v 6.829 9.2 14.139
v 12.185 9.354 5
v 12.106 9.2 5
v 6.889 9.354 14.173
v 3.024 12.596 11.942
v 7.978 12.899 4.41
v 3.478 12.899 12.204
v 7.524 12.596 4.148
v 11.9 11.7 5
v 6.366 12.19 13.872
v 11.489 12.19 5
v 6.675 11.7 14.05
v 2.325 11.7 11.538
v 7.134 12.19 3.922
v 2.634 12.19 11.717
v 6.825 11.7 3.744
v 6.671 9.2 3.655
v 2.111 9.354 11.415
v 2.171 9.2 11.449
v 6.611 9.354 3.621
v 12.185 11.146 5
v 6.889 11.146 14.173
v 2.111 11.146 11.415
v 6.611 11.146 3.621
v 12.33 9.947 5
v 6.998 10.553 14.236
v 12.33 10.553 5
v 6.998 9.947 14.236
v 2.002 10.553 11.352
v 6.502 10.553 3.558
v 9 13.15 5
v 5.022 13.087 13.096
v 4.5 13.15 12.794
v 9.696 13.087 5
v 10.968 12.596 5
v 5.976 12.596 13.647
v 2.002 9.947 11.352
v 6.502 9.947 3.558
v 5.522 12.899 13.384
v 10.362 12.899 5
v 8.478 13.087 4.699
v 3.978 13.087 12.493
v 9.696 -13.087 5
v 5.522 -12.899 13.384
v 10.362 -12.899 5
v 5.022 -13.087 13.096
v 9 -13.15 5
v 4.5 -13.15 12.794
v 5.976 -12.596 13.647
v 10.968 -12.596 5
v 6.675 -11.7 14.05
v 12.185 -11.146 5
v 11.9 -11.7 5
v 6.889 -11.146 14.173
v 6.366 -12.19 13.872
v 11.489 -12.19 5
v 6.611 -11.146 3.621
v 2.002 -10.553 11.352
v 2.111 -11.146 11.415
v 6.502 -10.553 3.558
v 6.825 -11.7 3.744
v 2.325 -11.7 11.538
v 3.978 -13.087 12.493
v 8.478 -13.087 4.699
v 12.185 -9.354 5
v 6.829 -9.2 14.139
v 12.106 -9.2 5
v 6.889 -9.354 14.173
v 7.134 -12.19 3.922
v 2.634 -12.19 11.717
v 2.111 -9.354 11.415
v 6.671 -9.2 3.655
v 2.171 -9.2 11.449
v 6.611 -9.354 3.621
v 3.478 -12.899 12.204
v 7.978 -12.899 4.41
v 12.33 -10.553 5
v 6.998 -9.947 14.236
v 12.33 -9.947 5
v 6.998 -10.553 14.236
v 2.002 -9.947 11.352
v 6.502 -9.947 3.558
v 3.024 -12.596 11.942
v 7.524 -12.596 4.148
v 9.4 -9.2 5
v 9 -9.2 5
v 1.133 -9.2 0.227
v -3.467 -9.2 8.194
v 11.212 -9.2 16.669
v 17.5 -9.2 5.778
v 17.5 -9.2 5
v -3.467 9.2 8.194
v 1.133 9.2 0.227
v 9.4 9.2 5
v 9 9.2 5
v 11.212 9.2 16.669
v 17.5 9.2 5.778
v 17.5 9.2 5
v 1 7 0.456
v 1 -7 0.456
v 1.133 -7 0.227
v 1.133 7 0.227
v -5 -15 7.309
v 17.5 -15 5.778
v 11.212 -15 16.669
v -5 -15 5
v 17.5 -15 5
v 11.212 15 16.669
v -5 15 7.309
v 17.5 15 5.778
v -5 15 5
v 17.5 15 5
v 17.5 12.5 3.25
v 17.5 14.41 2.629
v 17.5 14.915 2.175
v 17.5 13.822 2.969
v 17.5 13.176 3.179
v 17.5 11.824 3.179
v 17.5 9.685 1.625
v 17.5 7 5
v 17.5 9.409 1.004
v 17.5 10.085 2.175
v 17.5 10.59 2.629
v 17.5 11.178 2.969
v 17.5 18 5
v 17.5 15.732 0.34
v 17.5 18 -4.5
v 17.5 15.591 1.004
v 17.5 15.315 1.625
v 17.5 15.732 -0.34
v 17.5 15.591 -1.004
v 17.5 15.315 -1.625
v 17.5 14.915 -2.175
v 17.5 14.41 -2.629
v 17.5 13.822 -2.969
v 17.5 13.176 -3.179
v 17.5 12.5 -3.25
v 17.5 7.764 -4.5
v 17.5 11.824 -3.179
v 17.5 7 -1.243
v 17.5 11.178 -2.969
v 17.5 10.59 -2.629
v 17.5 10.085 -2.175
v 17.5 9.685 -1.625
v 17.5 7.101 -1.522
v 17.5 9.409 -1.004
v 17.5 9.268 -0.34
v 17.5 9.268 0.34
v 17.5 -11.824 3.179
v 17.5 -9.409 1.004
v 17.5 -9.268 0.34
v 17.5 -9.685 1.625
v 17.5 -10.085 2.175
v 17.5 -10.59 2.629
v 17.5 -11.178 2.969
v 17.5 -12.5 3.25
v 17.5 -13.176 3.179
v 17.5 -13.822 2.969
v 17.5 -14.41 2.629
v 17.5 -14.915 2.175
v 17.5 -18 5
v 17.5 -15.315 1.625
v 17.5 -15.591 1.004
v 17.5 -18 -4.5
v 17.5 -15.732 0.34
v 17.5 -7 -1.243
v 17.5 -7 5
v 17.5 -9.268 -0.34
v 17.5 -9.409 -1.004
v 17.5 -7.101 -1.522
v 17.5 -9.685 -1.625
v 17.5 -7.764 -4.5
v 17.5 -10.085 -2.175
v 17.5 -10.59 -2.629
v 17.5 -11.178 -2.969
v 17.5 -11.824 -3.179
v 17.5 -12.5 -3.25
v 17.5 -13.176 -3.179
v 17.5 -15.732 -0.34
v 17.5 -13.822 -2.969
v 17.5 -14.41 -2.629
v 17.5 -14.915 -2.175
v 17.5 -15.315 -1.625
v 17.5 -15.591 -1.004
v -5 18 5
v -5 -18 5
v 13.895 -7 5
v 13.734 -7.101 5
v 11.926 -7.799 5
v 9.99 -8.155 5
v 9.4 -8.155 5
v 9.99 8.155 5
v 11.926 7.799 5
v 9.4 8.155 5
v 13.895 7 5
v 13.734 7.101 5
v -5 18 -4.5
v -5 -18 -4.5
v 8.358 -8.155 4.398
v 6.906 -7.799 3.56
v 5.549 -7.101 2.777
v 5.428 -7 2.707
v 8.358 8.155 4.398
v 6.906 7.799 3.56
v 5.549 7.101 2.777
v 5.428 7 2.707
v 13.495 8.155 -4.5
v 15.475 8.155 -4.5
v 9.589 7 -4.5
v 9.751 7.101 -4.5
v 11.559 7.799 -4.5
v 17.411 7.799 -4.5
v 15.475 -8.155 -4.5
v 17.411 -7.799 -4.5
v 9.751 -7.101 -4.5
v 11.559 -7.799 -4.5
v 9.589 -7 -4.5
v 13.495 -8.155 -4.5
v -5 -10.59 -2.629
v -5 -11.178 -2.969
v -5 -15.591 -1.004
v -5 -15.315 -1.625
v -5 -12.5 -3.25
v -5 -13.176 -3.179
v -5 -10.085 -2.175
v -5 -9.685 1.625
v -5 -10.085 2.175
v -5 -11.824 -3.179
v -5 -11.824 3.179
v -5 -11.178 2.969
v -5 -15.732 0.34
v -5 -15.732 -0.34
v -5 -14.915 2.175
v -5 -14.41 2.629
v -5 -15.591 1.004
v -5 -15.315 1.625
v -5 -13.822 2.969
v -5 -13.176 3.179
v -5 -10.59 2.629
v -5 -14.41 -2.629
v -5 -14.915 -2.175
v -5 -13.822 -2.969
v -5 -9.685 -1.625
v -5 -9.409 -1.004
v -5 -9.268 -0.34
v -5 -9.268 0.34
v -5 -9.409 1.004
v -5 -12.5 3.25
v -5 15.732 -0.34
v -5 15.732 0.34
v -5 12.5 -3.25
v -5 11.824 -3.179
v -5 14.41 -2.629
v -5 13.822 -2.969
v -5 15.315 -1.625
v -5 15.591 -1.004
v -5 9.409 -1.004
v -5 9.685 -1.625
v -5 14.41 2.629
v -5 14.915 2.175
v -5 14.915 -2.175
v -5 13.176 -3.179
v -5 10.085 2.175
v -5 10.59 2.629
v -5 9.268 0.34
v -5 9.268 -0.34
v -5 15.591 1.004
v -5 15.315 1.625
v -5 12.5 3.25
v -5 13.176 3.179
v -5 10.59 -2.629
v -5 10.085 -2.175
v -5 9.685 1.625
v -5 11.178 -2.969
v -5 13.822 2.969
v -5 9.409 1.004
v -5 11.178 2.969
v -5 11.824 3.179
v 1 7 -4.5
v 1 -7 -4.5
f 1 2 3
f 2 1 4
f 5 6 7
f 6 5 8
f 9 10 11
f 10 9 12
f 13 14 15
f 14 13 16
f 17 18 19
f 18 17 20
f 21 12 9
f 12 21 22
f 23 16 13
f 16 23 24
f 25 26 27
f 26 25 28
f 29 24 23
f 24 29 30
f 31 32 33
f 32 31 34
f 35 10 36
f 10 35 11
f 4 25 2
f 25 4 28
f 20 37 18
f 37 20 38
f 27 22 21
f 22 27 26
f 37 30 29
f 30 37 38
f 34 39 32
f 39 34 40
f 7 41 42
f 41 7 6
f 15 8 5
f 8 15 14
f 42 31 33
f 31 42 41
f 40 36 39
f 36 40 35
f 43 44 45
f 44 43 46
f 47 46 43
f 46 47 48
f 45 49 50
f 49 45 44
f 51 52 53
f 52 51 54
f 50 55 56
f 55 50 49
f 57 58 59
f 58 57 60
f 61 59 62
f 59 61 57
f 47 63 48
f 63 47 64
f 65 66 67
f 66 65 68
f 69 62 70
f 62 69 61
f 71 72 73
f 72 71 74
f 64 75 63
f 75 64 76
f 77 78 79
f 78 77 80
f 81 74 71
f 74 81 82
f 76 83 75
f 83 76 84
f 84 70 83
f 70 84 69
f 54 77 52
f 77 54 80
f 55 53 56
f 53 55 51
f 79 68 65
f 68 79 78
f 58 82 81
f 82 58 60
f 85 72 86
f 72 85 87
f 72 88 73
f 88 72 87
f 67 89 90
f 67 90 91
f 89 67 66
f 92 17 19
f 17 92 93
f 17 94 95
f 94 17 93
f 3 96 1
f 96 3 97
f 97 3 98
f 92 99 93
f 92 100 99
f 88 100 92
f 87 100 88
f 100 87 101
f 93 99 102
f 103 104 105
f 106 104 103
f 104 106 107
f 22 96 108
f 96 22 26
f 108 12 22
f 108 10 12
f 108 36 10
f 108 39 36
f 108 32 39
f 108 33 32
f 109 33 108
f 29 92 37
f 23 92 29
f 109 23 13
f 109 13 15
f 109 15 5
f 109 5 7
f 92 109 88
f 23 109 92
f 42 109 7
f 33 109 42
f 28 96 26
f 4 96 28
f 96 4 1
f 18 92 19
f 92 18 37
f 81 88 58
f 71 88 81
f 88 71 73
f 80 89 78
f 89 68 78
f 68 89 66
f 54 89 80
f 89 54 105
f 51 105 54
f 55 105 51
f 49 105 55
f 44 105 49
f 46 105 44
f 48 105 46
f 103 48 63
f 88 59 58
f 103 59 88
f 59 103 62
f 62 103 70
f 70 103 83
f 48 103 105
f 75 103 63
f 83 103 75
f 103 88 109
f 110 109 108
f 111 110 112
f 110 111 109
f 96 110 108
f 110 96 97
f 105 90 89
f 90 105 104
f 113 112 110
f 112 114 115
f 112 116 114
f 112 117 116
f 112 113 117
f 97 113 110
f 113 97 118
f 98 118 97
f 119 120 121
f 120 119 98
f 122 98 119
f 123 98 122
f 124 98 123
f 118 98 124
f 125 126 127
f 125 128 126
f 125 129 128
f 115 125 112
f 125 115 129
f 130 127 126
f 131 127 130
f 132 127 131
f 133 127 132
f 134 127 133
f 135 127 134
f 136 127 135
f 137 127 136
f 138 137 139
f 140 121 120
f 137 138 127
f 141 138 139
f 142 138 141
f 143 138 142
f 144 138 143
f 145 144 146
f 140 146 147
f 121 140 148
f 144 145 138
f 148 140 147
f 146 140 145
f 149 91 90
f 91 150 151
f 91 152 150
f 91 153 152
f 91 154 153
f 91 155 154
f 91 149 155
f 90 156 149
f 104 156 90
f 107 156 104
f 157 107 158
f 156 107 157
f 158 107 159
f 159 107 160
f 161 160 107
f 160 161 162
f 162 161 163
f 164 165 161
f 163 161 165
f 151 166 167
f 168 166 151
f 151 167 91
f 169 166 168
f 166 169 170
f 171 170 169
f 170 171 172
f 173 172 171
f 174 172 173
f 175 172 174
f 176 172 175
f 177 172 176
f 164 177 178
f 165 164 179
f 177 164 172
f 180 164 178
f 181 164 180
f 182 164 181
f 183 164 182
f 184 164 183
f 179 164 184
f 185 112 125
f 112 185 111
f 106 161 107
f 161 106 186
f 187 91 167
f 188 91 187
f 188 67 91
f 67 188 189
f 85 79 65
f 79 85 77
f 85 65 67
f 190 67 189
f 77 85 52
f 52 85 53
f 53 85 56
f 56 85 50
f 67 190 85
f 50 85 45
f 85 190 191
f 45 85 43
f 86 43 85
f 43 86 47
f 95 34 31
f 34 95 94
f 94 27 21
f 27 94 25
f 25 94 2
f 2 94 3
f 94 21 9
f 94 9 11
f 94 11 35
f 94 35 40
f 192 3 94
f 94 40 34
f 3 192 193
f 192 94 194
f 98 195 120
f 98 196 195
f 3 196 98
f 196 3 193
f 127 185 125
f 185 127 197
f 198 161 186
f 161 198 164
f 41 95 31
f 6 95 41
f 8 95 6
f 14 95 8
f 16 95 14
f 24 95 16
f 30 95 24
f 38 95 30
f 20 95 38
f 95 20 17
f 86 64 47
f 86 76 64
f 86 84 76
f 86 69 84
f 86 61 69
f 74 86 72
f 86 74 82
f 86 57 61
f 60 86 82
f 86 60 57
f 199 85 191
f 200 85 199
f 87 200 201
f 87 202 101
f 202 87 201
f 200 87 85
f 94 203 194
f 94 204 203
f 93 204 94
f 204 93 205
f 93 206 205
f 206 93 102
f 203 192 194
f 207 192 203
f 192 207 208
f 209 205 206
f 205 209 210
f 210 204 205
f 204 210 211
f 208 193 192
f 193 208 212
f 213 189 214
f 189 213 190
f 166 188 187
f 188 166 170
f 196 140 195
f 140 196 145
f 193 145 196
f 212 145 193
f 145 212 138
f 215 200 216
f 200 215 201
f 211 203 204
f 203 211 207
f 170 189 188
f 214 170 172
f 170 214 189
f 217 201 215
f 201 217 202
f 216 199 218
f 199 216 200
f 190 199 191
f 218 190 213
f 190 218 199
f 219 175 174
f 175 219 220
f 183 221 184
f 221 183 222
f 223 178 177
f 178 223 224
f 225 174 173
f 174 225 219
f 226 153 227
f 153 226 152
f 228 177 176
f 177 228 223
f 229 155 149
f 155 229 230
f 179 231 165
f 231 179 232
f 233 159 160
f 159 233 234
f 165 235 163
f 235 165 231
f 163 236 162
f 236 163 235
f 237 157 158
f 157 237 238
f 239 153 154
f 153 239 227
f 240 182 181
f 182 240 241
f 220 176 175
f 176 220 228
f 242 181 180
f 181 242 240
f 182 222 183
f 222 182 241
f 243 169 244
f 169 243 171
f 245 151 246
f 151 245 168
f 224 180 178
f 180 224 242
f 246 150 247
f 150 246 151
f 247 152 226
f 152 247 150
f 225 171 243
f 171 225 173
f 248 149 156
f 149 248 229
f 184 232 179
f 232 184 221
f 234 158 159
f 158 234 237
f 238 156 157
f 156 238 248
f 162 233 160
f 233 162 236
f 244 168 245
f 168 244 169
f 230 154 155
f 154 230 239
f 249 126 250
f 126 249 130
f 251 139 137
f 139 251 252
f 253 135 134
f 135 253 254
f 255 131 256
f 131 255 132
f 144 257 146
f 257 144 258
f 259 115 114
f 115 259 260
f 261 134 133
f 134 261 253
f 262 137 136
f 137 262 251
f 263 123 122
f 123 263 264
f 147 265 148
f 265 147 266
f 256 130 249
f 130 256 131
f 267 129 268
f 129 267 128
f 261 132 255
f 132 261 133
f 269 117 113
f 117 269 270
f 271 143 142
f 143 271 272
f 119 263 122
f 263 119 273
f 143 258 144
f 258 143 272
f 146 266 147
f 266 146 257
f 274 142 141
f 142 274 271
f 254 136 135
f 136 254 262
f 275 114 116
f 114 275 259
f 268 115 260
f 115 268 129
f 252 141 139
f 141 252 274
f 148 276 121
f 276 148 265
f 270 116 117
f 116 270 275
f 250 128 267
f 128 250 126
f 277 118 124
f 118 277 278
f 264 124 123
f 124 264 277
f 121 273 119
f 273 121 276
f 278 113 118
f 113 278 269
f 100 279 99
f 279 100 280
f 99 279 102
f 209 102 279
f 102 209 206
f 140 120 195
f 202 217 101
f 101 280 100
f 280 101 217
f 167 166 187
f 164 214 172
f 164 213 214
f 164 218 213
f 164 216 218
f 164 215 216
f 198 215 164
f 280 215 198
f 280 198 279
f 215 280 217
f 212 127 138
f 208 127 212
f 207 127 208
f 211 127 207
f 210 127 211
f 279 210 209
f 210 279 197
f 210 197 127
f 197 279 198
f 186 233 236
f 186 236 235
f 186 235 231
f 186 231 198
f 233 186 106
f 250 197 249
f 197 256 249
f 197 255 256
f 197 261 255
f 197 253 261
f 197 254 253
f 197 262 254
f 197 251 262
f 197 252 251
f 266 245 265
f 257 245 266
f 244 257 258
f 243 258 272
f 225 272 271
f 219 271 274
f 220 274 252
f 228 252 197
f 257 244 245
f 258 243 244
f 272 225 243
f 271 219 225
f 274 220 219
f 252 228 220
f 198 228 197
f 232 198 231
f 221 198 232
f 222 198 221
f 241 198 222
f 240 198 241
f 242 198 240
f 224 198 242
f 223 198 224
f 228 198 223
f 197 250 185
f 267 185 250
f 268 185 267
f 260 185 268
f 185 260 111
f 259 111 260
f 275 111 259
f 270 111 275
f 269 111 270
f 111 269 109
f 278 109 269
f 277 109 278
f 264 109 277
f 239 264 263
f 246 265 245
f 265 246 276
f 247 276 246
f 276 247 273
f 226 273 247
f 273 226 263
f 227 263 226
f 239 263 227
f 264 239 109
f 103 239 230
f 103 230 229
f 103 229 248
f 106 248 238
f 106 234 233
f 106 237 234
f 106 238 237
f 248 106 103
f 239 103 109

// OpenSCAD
// file: dronePlates.scad
/**
 * dronePlates.scad
 * Plate library
 *
 * GNU GPL V3
 * @author: Victor Potenciano
 */

m3Rad = 3.4/2;
cornerR = 4;

/**
 *
 */
module helperDisk(diameter) {
	cylinder(r = diameter/2, h = 0.6, $fn=20);
}

/**
 *
 */
module roundedRect(size, radius) {
	x = size[0];
	y = size[1];
	z = size[2];

	linear_extrude(height=z)
	hull() {
	// place 4 circles in the corners, with the given radius
	translate([(-x/2)+(radius/2), (-y/2)+(radius/2), 0]){ circle(r=radius); }
	translate([(x/2)-(radius/2), (-y/2)+(radius/2), 0]){ circle(r=radius); }
	translate([(-x/2)+(radius/2), (y/2)-(radius/2), 0]){ circle(r=radius); }
	translate([(x/2)-(radius/2), (y/2)-(radius/2), 0]){ circle(r=radius); }
	}
}

/**
 * rounded rectangle triangle with corner at origin
 */
module roundedTriangle(size, radius) {
	x = size[0];
	y = size[1];
	z = size[2];

	linear_extrude(height=z)
	hull() {
	translate([radius, radius, 0]){ circle(r=radius); }
	translate([x-radius, radius, 0]){ circle(r=radius); }
	translate([radius, y-radius, 0]){ circle(r=radius); }
	}
}

/**
 *
 */
module roundRectPlate(w, l, plateThick=3) {
	difference(){
		roundedRect([l+m3Rad*1.75,w+m3Rad*1.75,plateThick], cornerR);
		translate([l/2, w/2, -0.5]) { cylinder(h = plateThick+1, r = m3Rad, $fn=30); }
		translate([-l/2, w/2, -0.5]) { cylinder(h = plateThick+1, r = m3Rad, $fn=30); }
		translate([l/2, -w/2, -0.5]) { cylinder(h = plateThick+1, r = m3Rad, $fn=30); }
		translate([-l/2, -w/2, -0.5]) { cylinder(h = plateThick+1, r = m3Rad, $fn=30); }
	}
}

/**
 *
 */
module crossSquarePlate(l, thick=3) {
	inDist = cornerR*2+4;
	trianL = sqrt((l*l)/2)-inDist;
	centerR = 4;

	difference(){
		roundRectPlate(l, l, thick);
		translate([0, centerR, -0.5]) { 
			rotate([0,0,45]){ roundedTriangle([trianL,trianL,thick+1], cornerR-2); }
		}
		translate([0, -centerR, -0.5]) { 
			rotate([0,0,225]){ roundedTriangle([trianL,trianL,thick+1], cornerR-2); }
		}
		translate([-centerR, 0, -0.5]) { 
			rotate([0,0,135]){ roundedTriangle([trianL,trianL,thick+1], cornerR-2); }
		}
		translate([centerR, 0, -0.5]) { 
			rotate([0,0,-45]){ roundedTriangle([trianL,trianL,thick+1], cornerR-2); }
		}
	}
}

/**
 *
 */
module hShapePlate(w, l, thick=4) {
	inDist = cornerR*2+1;

	difference(){
		roundRectPlate(w, l, thick);
		translate([0, w/4, -0.5]) { roundedRect([l-inDist,w/2-inDist,thick+1], cornerR-2); }
		translate([0, -w/4, -0.5]) { roundedRect([l-inDist,w/2-inDist,thick+1], cornerR-2); }
	}
}

/**
 *
 */
module motorCircleMount(inDia, outDia, thick=3, extraH=false, d1=19, d2=16, holeR=m3Rad ) {
	difference(){
		cylinder(h = thick, r = outDia/2, $fn=30);
		motorCircleMountHoles(inDia, outDia, thick, extraH, d1=d1, d2=d2, holeR=holeR);
	}
}

/**
 *
 */
module motorCircleMountHoles(inDia, outDia, thick=3, extraH=false, d1=19, d2=16, d3=25, holeR=m3Rad) {
	translate([0, 0, -0.5]) { cylinder(h = thick+1, r = inDia/2, $fn=30); }

	for(i=[0:3]) {
		rotate([0,0,90*i]){
		translate([d1/2, 0, -0.5]) cylinder(h = thick+1, r = holeR, $fn=20);
		translate([d2/2, 0, -0.5]) cylinder(h = thick+1, r = holeR, $fn=20);
		translate([d2/2, -holeR, -0.5]) cube(size = [(d1-d2)/2,holeR*2,thick+1]);
		}
	}
	
	if(extraH==true){	
		for(i=[-1,1]) translate([i*d3/2, 0, -0.5]) { cylinder(h = thick+1, r = holeR, $fn=30); }
	}
}

/**
 *
 */
module motorRectMount(w, l, inDia, thick=3) {
	d1=19;
	d2=16;

	difference(){
		roundRectPlate(w, l, thick);
		translate([0, 0, -0.5]) { cylinder(h = thick+1, r = inDia/2, $fn=30); }
		translate([0, d1/2, -0.5]) { cylinder(h = thick+1, r = m3Rad, $fn=30); }
		translate([0, -d1/2, -0.5]) { cylinder(h = thick+1, r = m3Rad, $fn=30); }
		translate([d2/2, 0, -0.5]) { cylinder(h = thick+1, r = m3Rad, $fn=30); }
		translate([-d2/2, 0, -0.5]) { cylinder(h = thick+1, r = m3Rad, $fn=30); }
	}
}

/**
 *
 */
module tube(inDia, outDia, height) {
	difference(){
		cylinder(h = height, r = outDia/2, $fn=50);
		translate([0, 0, -0.5]) { cylinder(h = height+1, r = inDia/2, $fn=30); }
	}
}

/**
 *
 */
module squareTube(inDia, outDia, height) {
	translate([0,0,height/2]){
	difference(){
		cube(size = [outDia,outDia,height], center = true);
		cube(size = [inDia,inDia,height+1], center = true);
	}
	}
}

/**
 *
 */
module djiFlamewheelHoles(height) {
	a = 23;
	b = 16;
	c = 19.5;
	
	translate([a/2, c/2, 0]) { cylinder(h = height, r = m3Rad, $fn=30); }
	translate([-a/2, c/2, 0]) { cylinder(h = height, r = m3Rad, $fn=30); }
	translate([b/2, -c/2, 0]) { cylinder(h = height, r = m3Rad, $fn=30); }
	translate([-b/2, -c/2, 0]) { cylinder(h = height, r = m3Rad, $fn=30); }
}

/**
 *
 */
module djiFlamewheelHolesBotton(height) {
	a1 = 21;
	c = 19.5;
	
	translate([a1/2, c/2, 0]) { cylinder(h = height, r = m3Rad, $fn=30); }
	translate([-a1/2, c/2, 0]) { cylinder(h = height, r = m3Rad, $fn=30); }
}

/**
 *
 */
module propeller(size){
union(){
difference(){
	cylinder(h = 3, r = size/2, center=true, $fn=30);
	cylinder(h = 3.1, r = size/2-2, center=true, $fn=30); 
}
for( i = [-1,1] ){
rotate([0,0,45*i]){ cube(size = [size,4,1], center = true); }
}
}
}

/**
 *
 */
module slot(length, height, rad){
for(i=[-1,1]) translate([i*length/2,0,0]) cylinder(h = height, r = rad, $fn=30);
translate([0,0,height/2]) cube(size = [length,rad*2,height], center = true);
}

 

////////////////////////
// Examples:
////////////////////////

motorCircleMount(8, 25, 3.5);

//roundedRect([50,50,3], 4);

//hShapePlate(79, 25);

//rotate([0,0,45]){roundedTriangle([40,40,3], 4);}

//crossSquarePlate(45, 4);

/*
union(){
motorRectMount(21, 18, 8, 4);
translate([9, 10.5, 0]) {tube(m3Rad*2, 6.5, 6);}
}
*/

/*
difference(){
union(){
hShapePlate(50, 30, 3.5);
translate([-4,-25,0]){cube(size = [8,50,3.5]);}
rotate([0, 0, 45]) {motorCircleMount(8, 35, 3.5);}
}
cylinder(h = 10, r = 4, $fn=100, center=true);
}
*/

//rotate([90,0,0]){ tube(5,10,20); }
//translate([20,0,0]){ squareTube(5, 10, 20); }
// main file
/**
 * lt210 fpv camera mount
 */
 
use <dronePlates.scad>;

thick = 1.5;
hubSqH=20;
tolerance=0.4;
front_cc = 25;
angle=30;

/**
 *
 */
module cameraHub(tolerance=0){
sqL = 18;

translate([0,0,hubSqH/2]) cube(size=[sqL+tolerance,sqL+tolerance,hubSqH+tolerance], center=true);
cylinder(r=7.5+(tolerance/2), h=16, $fn=20);
for(i=[-1,1]) translate([i*10.25,0,0]) cylinder(h=hubSqH,r=2.7+(tolerance/2),$fn=30);
//translate([0,0,16/2])cube(size=[3+tolerance,sqL+4+tolerance,16], center=true);
}//end module

/**
 *
 */
module housing(){
difference(){
cube(size=[30,30,hubSqH-2], center=true);
scale([1,1,1.1]) translate([0,0,-hubSqH/2]) cameraHub(tolerance=tolerance);
translate([0,13,0]) cube(size=[32+1,10+0.5,hubSqH], center=true);
}
}//end module

/**
 *
 */
module fpvCam(){
    union(){
    cube([32,32,1.5], center=true);
    translate([0,0,4]) cube([18,18,8], center=true);
    cylinder(r=8.5, h=25, $fn=20);
    }
}

shiftZ= 5;
shiftX=9;
preShZ = 0;
//color("grey") translate([2,0,16]) rotate([0,180-angle,0]) fpvCam();

color(alpha=0.4)
difference(){
    union(){
        cube([35,36,10], center=true);
        translate([shiftX,0,shiftZ])  rotate([0,-angle,0]) translate([0,0,-preShZ]) rotate([0,0,-90]) housing();
    }
    
    translate([shiftX,0,shiftZ]) rotate([0,-angle,0]) {
    translate([0,0,preShZ]) rotate([0,0,-90]) cameraHub(tolerance=tolerance);
    cylinder(r=8.2, h=60, center=true, $fn=30);
    //translate([-9.25,0,0]) cube(size=[4,4,60], center=true);
    }
    
    for(i=[-1,1]){
        translate([0,i*front_cc/2,0]) rotate([0,90,0]) 
            cylinder(r=6.5/2, h=100, $fn=30, center=true);
    }
    
    translate([10,0,0]) cube(size=[18,14,50], center=true);
    translate([35/2+10/2,0,0]) cube(size=[10,40,50], center=true);
    translate([0,0,-9.5]) cube(size=[40,40,10], center=true);
    translate([-11.5,0,0]) cube(size=[13,50,50], center=true);
}
